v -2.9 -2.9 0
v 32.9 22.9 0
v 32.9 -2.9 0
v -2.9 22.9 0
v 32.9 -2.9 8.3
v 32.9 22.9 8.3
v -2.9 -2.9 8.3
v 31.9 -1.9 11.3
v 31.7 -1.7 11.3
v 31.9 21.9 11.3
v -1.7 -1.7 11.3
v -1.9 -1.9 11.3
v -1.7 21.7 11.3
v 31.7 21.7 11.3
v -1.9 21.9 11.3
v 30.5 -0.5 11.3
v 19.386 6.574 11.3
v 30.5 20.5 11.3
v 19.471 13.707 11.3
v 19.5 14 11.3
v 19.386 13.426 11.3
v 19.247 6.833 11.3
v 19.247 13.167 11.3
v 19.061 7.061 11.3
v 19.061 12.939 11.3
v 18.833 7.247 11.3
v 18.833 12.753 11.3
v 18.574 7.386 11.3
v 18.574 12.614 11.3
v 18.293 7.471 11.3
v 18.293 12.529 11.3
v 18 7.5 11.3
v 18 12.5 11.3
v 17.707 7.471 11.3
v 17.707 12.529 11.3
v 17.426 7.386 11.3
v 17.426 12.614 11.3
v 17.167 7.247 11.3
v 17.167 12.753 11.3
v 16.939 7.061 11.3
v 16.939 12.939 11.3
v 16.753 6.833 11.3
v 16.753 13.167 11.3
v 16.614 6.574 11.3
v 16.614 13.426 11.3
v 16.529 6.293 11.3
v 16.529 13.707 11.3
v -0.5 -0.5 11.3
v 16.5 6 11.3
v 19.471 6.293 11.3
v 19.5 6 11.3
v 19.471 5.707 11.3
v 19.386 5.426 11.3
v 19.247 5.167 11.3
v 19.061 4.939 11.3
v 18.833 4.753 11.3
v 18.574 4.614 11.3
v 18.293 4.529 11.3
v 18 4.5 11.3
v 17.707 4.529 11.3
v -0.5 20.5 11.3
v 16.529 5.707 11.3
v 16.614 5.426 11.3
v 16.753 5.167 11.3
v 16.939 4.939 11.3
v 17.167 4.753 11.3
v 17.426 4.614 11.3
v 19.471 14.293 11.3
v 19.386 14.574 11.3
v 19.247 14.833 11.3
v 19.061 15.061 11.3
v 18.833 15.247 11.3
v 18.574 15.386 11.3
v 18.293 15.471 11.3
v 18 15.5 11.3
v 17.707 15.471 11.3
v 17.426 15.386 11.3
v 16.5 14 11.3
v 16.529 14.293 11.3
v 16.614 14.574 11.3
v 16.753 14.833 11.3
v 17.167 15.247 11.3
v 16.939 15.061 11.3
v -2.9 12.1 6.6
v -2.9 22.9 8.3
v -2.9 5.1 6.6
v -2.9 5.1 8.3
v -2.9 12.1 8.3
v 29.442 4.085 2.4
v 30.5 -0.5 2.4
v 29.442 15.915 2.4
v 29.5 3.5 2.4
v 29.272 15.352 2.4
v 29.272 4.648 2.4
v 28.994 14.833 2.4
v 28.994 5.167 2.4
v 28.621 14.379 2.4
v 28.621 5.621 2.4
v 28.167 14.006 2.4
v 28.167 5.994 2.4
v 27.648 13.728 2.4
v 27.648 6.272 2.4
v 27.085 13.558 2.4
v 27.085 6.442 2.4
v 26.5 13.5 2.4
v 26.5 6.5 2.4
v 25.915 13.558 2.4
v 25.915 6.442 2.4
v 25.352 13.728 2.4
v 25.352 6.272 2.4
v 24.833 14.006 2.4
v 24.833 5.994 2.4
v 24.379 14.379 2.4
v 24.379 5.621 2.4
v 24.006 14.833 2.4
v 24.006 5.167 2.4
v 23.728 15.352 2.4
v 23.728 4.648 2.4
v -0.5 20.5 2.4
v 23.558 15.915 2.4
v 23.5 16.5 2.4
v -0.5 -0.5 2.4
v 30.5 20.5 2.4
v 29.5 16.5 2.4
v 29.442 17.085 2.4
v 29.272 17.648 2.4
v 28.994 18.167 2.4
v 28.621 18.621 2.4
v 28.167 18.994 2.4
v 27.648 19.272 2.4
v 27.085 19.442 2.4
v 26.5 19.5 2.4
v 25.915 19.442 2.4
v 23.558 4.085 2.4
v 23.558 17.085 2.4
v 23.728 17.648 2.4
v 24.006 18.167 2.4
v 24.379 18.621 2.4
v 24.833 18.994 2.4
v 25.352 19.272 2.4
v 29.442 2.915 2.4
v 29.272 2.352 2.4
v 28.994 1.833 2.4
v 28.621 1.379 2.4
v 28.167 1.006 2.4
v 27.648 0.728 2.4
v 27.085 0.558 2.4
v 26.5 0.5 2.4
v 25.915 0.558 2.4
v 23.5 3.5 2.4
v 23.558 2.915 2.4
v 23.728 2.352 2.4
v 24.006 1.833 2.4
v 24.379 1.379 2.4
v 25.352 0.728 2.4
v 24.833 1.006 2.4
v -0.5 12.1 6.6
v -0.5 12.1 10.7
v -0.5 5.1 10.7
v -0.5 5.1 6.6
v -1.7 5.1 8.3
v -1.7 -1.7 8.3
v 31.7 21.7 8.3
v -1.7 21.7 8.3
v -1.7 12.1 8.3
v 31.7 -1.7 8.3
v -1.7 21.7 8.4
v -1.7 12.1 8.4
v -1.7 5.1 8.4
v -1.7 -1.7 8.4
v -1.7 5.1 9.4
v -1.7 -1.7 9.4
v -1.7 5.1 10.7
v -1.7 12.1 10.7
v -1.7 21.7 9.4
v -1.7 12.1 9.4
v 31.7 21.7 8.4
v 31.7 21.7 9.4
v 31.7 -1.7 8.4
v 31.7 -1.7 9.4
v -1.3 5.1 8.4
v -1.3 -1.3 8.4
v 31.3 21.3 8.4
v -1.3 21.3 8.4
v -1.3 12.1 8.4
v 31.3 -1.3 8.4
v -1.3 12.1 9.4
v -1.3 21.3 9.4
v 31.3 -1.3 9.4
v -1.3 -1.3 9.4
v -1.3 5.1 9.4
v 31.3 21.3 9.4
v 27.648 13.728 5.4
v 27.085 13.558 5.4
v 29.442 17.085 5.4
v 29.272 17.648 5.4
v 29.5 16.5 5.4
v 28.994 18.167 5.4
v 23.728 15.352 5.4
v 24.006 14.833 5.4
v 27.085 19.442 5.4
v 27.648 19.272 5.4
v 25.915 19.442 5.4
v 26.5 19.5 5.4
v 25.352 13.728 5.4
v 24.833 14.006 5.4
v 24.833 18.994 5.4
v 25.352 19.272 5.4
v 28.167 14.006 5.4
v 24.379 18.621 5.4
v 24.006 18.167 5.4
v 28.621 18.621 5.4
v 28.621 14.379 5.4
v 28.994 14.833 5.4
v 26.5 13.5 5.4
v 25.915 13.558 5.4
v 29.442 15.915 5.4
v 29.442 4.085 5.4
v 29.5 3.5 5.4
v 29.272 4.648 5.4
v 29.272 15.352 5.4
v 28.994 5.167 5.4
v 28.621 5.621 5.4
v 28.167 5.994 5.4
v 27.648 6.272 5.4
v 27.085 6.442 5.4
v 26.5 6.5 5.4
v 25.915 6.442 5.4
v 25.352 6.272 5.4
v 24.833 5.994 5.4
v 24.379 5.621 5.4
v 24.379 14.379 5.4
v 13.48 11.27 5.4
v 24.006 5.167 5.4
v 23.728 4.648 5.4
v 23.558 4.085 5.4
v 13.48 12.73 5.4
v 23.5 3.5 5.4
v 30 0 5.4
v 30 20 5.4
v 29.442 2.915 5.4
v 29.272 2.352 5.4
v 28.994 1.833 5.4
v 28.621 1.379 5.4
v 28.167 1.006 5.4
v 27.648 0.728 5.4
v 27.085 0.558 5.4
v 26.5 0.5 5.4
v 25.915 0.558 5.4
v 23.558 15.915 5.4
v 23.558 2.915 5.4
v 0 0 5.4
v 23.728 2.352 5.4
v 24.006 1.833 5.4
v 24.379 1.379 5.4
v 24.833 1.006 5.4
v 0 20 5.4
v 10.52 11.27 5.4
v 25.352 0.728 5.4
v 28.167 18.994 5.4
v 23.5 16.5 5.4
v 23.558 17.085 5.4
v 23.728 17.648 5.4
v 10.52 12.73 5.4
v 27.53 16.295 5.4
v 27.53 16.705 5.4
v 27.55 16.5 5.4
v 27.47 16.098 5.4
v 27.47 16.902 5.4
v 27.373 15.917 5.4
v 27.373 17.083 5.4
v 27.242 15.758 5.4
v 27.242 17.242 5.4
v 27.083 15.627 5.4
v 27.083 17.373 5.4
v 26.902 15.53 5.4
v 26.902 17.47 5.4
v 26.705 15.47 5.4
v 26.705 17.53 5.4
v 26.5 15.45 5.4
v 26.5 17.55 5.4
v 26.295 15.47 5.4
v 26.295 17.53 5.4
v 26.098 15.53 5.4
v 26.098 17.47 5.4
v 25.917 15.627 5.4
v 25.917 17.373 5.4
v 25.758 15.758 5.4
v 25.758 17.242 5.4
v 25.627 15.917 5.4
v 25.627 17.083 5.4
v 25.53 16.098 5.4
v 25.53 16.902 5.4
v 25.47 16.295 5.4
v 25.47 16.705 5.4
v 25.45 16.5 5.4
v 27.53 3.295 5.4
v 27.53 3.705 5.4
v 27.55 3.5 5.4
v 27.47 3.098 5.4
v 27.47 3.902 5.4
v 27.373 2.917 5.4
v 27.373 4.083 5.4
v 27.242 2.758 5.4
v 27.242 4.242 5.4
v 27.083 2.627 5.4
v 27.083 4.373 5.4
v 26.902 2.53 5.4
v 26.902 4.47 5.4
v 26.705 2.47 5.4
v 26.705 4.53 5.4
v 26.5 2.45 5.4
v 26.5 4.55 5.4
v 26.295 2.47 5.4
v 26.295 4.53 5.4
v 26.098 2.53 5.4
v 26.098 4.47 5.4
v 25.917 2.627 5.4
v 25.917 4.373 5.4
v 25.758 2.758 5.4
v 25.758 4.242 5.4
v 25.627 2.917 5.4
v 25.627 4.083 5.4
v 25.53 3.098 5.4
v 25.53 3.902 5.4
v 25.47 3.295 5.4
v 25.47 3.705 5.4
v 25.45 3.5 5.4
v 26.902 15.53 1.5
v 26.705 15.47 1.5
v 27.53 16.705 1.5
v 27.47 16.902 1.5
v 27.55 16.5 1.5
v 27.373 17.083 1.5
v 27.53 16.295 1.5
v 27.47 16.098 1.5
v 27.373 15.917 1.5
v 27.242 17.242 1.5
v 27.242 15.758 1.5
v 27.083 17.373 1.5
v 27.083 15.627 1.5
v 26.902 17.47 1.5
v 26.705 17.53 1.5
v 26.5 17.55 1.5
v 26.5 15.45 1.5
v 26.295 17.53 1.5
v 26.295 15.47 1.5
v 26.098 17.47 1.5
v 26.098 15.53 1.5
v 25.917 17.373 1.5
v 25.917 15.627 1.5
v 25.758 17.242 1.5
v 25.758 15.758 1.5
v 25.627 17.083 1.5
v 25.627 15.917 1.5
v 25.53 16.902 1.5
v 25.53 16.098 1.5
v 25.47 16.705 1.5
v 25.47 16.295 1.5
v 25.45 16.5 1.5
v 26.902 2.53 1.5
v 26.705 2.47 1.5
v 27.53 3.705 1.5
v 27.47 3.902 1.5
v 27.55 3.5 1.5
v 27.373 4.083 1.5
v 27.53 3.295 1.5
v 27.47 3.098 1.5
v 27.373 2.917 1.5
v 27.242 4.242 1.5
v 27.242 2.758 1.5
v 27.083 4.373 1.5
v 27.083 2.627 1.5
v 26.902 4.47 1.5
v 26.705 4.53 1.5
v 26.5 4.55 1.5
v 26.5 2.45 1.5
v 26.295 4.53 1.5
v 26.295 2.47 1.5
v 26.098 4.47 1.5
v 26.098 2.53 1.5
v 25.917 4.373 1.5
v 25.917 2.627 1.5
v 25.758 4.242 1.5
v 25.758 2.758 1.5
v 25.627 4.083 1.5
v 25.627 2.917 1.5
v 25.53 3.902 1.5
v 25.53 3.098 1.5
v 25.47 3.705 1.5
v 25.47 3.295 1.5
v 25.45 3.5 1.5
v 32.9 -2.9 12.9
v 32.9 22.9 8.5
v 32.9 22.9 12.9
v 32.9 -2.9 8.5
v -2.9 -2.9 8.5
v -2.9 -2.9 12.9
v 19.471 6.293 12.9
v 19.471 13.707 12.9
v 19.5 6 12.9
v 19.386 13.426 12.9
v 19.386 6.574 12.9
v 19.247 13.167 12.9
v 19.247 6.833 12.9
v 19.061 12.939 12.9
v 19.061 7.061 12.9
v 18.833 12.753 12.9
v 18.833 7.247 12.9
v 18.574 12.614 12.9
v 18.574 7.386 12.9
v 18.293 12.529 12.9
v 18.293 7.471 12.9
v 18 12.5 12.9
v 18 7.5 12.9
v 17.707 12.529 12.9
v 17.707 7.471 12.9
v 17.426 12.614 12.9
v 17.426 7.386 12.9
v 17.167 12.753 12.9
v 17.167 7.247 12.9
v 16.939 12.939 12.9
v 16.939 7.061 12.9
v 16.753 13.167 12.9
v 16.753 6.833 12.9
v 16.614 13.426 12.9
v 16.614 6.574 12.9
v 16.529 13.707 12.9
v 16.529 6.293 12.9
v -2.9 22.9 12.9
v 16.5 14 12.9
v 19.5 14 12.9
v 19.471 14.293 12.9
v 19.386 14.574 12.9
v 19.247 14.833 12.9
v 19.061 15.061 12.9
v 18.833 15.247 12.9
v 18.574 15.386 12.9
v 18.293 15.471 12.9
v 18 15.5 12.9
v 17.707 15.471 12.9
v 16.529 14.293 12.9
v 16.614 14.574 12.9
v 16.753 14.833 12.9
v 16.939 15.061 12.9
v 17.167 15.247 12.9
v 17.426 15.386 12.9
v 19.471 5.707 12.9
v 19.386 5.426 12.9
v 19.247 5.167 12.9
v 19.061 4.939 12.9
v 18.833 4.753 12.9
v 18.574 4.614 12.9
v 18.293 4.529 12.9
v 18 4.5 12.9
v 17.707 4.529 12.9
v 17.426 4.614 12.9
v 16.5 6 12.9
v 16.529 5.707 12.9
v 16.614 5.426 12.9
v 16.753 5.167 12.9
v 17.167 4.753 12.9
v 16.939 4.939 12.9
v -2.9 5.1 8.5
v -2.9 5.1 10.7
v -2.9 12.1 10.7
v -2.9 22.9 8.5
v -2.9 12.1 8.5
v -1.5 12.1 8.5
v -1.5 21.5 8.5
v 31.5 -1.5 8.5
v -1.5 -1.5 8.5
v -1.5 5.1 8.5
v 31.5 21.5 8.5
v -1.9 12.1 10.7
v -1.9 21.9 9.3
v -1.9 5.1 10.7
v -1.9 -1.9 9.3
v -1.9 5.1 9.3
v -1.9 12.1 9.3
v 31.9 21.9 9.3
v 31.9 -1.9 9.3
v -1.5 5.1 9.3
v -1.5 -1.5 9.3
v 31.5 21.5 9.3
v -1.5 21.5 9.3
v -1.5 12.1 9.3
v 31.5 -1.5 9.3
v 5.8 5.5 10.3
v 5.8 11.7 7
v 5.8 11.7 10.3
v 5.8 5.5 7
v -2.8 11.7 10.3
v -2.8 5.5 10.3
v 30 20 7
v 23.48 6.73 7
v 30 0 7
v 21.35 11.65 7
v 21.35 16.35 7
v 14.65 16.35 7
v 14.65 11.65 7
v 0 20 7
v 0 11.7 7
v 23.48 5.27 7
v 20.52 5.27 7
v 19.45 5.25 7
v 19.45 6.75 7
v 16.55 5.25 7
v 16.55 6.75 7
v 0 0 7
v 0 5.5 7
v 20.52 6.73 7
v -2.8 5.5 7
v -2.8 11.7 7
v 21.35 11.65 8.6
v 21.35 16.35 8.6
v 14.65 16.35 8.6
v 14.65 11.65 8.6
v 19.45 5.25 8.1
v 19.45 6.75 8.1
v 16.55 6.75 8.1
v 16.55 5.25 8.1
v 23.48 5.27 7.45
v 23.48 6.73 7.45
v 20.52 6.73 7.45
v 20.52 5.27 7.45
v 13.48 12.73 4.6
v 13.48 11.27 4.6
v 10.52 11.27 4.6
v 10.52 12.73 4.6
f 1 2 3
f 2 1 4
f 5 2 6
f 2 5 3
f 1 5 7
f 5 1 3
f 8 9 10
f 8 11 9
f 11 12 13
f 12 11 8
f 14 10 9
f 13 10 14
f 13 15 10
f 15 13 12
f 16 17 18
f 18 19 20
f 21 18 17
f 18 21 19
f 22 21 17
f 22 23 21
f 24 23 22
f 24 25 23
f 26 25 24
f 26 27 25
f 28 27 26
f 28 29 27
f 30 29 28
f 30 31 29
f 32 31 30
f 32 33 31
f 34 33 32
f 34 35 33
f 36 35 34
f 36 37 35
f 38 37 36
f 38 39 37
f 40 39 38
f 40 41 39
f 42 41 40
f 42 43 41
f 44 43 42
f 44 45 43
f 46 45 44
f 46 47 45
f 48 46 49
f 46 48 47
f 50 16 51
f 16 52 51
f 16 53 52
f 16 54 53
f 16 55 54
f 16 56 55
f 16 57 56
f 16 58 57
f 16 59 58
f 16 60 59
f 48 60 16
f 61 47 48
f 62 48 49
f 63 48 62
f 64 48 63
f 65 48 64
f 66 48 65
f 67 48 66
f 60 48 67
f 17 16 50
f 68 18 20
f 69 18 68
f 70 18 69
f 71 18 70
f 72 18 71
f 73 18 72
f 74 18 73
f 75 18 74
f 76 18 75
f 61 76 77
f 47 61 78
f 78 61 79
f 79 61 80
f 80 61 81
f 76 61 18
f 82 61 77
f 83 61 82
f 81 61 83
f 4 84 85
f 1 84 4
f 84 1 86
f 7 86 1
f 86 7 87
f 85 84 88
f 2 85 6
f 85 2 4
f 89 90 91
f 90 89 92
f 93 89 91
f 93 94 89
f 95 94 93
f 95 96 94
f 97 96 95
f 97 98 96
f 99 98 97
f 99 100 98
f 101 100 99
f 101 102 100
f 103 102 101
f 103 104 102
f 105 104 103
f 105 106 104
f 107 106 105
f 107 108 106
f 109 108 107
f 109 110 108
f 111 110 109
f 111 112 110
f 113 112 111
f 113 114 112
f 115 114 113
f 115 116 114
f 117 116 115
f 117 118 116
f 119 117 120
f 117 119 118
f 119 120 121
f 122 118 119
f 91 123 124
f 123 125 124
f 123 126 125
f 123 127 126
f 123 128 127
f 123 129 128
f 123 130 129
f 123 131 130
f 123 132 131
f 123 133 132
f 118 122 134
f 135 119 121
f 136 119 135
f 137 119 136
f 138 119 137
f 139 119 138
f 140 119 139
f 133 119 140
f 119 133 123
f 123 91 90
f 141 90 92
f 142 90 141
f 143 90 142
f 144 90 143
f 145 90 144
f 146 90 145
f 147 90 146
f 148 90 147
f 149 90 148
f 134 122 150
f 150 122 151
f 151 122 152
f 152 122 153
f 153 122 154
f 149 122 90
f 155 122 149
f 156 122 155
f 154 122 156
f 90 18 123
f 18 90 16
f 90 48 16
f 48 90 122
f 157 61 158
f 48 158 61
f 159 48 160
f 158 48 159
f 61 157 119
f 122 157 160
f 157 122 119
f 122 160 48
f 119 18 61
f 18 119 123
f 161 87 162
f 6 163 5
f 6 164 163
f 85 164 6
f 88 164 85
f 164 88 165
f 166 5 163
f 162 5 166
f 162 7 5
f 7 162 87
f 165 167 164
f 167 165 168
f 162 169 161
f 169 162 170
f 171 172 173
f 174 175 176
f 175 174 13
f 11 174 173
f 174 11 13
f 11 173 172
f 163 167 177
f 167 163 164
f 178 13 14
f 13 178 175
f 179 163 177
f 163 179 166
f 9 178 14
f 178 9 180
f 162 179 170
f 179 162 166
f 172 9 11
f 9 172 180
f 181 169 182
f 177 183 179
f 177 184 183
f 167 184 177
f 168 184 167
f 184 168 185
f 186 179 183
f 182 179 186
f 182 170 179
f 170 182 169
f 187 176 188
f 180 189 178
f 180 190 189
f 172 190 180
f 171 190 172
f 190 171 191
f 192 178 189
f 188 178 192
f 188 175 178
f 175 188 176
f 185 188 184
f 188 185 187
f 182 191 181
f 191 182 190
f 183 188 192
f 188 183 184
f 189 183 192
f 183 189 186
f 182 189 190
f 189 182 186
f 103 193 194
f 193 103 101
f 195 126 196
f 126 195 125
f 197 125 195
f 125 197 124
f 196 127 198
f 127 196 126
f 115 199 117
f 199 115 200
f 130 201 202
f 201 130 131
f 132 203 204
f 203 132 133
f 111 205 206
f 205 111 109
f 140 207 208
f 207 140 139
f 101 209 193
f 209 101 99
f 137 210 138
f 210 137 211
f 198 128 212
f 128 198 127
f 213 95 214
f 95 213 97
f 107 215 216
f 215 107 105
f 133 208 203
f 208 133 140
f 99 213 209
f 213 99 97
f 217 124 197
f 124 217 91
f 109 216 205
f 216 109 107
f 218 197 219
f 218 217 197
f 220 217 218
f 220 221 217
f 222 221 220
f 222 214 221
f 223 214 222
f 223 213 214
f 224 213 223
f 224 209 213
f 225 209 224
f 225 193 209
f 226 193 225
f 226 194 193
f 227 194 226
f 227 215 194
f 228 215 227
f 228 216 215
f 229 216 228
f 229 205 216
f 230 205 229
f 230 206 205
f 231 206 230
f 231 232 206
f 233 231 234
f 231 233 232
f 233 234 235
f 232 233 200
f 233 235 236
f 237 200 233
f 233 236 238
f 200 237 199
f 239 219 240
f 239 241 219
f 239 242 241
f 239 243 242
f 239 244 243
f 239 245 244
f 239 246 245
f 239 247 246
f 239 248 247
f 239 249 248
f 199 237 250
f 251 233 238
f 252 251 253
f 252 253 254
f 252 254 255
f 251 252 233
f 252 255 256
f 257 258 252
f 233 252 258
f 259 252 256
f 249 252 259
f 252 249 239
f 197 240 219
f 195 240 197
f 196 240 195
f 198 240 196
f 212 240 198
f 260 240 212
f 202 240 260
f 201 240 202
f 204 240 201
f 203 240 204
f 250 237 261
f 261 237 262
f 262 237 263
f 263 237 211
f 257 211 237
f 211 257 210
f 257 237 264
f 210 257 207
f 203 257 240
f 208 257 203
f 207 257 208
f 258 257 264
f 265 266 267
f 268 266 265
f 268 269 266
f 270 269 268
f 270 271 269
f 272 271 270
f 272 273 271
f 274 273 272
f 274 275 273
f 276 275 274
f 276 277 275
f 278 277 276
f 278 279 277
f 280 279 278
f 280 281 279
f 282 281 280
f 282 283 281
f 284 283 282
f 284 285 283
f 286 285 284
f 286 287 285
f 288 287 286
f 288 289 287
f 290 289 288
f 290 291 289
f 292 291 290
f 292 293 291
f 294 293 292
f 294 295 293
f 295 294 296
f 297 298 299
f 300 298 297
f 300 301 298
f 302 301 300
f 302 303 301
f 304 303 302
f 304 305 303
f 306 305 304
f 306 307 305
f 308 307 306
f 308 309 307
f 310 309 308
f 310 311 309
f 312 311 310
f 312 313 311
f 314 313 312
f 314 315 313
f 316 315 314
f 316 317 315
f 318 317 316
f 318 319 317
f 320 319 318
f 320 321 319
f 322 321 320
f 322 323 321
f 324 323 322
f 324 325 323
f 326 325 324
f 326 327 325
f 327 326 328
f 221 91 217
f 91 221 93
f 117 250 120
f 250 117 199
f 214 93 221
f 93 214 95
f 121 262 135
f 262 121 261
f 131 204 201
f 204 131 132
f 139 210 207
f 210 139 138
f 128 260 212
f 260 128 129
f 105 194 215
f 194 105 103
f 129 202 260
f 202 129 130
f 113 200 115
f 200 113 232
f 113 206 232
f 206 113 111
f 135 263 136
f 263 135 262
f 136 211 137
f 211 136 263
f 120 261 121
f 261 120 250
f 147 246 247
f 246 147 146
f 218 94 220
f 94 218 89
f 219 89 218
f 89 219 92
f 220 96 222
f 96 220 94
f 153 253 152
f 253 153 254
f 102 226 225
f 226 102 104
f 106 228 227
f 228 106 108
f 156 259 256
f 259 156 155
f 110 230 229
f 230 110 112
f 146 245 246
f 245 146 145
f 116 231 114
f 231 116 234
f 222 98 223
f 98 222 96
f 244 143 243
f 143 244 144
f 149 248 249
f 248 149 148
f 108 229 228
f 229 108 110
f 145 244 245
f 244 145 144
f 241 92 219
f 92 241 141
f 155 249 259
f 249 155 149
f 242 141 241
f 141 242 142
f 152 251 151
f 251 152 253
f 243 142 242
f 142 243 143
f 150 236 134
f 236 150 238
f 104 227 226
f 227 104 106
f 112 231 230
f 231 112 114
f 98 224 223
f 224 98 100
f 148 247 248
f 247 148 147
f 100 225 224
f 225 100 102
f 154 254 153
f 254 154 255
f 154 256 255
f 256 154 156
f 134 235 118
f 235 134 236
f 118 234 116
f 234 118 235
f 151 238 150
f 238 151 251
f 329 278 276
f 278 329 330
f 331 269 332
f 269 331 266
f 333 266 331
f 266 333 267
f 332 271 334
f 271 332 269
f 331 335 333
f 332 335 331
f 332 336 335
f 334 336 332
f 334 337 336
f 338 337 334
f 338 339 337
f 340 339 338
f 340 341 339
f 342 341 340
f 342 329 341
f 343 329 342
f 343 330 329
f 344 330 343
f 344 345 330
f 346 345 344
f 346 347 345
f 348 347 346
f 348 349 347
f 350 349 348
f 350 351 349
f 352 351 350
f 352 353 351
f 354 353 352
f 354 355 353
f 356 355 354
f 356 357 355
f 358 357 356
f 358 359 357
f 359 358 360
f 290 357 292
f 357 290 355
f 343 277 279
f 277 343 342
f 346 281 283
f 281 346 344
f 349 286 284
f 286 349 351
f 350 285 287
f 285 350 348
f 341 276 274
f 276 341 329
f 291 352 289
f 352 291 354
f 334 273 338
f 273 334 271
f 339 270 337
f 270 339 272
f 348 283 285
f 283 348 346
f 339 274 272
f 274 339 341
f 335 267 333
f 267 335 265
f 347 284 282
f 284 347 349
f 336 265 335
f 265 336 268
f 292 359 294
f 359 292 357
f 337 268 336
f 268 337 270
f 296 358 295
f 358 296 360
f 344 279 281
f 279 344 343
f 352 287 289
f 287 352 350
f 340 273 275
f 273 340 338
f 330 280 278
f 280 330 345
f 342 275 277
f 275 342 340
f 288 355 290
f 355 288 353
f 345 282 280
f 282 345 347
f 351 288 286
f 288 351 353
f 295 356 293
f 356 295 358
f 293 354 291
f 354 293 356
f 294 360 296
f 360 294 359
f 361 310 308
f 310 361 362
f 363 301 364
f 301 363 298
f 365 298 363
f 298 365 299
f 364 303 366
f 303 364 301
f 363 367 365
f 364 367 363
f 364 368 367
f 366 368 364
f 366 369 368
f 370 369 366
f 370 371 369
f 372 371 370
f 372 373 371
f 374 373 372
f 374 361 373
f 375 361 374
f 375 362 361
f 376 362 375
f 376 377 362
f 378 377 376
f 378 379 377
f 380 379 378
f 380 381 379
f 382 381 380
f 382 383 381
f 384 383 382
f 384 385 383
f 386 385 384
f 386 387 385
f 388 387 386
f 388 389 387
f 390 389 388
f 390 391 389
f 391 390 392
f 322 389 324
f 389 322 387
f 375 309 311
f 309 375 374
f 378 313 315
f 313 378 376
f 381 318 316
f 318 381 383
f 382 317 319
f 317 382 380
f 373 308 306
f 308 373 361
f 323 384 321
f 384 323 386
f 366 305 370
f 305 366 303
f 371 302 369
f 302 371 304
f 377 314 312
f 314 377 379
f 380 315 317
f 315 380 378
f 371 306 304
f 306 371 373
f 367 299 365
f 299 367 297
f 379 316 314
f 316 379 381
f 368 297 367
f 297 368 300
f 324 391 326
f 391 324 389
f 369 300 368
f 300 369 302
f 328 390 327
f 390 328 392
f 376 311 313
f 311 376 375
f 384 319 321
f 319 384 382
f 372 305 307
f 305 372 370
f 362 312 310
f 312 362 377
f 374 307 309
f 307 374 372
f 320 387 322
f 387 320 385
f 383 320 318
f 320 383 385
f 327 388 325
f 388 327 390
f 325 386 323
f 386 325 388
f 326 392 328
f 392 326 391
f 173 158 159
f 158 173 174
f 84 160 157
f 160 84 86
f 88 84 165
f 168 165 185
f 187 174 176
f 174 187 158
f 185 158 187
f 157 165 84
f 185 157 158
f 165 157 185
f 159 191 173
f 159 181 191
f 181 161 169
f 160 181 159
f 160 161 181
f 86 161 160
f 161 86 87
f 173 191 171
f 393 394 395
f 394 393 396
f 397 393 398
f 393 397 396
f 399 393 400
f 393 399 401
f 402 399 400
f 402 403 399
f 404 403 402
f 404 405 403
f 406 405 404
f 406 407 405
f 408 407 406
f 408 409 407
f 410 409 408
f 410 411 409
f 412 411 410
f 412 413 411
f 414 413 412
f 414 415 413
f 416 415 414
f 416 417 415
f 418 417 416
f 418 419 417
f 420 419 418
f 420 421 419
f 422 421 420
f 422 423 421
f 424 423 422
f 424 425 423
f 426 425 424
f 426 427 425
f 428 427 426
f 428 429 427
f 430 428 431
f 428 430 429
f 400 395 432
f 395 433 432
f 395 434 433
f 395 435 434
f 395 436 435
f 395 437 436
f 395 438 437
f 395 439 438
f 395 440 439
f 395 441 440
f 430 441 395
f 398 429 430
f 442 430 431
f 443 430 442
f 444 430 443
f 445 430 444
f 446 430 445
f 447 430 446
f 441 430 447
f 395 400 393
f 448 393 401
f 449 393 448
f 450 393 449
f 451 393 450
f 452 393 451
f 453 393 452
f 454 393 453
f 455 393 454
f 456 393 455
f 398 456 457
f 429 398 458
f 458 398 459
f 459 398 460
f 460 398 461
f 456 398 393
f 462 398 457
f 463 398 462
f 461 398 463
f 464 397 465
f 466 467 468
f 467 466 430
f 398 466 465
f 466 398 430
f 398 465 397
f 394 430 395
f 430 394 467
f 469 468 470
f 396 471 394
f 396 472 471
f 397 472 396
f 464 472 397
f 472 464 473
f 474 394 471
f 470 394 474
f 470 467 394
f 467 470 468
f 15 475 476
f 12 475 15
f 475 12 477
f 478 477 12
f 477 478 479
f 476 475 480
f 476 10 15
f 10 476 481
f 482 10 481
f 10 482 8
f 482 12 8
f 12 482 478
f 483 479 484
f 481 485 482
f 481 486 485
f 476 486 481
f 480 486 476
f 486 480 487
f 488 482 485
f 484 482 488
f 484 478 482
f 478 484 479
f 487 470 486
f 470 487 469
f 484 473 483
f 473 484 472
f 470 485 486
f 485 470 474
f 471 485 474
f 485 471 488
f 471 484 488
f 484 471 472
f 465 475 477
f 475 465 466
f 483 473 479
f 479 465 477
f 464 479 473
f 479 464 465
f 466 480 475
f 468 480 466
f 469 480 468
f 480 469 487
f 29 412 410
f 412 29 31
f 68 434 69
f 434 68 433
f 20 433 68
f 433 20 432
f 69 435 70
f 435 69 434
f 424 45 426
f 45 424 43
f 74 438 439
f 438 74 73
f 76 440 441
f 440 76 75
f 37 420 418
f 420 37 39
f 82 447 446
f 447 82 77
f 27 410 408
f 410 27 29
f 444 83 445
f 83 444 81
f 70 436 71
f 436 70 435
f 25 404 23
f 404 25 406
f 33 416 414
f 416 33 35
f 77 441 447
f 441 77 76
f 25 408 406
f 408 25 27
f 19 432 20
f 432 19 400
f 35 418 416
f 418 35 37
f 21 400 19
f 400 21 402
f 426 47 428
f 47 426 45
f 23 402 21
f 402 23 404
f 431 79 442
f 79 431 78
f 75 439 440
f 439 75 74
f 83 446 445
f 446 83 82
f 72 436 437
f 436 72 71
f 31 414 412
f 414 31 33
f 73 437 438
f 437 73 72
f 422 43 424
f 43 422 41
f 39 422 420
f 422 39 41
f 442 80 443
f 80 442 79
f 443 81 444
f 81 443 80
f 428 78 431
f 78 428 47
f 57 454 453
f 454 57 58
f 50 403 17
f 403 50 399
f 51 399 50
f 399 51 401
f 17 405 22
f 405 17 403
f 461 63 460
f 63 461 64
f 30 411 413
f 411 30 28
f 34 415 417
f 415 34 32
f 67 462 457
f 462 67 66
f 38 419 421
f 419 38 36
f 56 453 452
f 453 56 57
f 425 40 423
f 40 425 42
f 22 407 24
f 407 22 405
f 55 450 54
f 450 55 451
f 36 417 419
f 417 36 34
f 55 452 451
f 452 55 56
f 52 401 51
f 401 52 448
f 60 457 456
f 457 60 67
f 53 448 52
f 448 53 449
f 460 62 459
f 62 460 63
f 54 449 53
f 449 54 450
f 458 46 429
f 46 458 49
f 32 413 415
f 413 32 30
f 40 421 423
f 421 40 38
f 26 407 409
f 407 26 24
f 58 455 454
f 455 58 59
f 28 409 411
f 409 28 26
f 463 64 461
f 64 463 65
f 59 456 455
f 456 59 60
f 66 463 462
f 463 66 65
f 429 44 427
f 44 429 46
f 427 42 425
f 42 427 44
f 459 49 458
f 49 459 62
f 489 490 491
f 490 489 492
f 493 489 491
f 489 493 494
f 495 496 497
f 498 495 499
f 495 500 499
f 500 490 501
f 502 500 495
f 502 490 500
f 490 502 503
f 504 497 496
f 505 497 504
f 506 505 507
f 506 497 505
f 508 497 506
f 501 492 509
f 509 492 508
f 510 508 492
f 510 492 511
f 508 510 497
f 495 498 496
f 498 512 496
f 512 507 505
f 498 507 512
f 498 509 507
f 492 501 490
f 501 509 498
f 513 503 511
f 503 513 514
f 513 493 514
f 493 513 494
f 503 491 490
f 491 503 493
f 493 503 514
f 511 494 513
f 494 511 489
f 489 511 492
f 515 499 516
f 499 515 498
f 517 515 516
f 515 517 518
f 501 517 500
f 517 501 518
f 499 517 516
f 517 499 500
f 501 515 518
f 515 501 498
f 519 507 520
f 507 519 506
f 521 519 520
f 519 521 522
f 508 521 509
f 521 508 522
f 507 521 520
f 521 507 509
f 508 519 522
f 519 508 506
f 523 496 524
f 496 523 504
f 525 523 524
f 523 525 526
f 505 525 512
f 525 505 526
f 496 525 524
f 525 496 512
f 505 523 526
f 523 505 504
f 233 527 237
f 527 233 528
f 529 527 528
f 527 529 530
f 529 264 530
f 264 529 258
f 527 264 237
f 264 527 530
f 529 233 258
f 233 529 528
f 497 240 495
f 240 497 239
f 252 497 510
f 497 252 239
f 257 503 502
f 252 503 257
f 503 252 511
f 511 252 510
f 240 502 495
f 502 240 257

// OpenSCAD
// file: usbc_snap_lid.scad
// The lid of the housing "usbc_snap", written by enclosure-nv 0.1.0
// from the board file usbc_board.kicad_pcb.  Render with OpenSCAD.
// Parameters, in millimetres.  The same block heads every file of this housing:
// when a value is changed, change it in each file.
wall = 2.4;
floor_t = 2.4;
lid_t = 1.6;
clear = 0.5;  // the board's edge to the inside of the wall
standoff_d = 6;
screw_d = 2.5;
pilot_d = 2.1;
head_d = 5;
head_h = 1.6;
lip_h = 3;  // the height of the step the lid sits on
lid_gap = 0.2;
snap_depth = 0.4;
snap_h = 0.8;
led_d = 3;
button_d = 3;
board_t = 1.6;
standoff_h = 3;  // the space under the board
top_space = 4.3;  // the space above the board
pilot_len = 3.9;  // the depth of the screw's hole
print_flip = false;  // true lays the lid plate down

// Levels along z.
z_bb = floor_t + standoff_h;
z_bt = z_bb + board_t;
z_split = z_bt + top_space;
z_step = z_split - lip_h;
z_top = z_split + lid_t;
z_skirt = z_step + lid_gap;
a_in = wall / 2;
screw_clear = screw_d + 0.3;

module outline() {
  polygon(points = [[0, 0], [30, 0], [30, 20], [0, 20]]);
}

module lid() {
  difference() {
    union() {
      // the plate
      translate([0, 0, z_split]) linear_extrude(height = lid_t) offset(delta = clear + wall) outline();
      // the skirt that takes the place of the outer half of the wall
      translate([0, 0, z_skirt]) linear_extrude(height = z_split - z_skirt + 0.2) difference() {
        offset(delta = clear + wall) outline();
        offset(delta = clear + a_in + lid_gap) outline();
      }
      // the bead that clicks into the wall's groove
      translate([0, 0, z_skirt]) linear_extrude(height = snap_h) difference() {
        offset(delta = clear + a_in + lid_gap + 0.2) outline();
        offset(delta = clear + a_in + lid_gap - snap_depth) outline();
      }
    }
    // the openings
    translate([0, 8.6, z_bt + (-0.4)]) rotate([0, 0, 180]) translate([-1, -3.5, 0]) cube([clear + wall + 2, 7, 4.1]);
    translate([18, 14, z_split - 1]) cylinder(h = lid_t + 2, d = 3, $fn = 32);
    translate([18, 6, z_split - 1]) cylinder(h = lid_t + 2, d = 3, $fn = 32);
  }
}

if (print_flip) {
  translate([0, 20, z_top]) rotate([180, 0, 0]) lid();
} else {
  lid();
}
// file: usbc_snap_base.scad
// The base of the housing "usbc_snap", written by enclosure-nv 0.1.0
// from the board file usbc_board.kicad_pcb.  Render with OpenSCAD.
// Parameters, in millimetres.  The same block heads every file of this housing:
// when a value is changed, change it in each file.
wall = 2.4;
floor_t = 2.4;
lid_t = 1.6;
clear = 0.5;  // the board's edge to the inside of the wall
standoff_d = 6;
screw_d = 2.5;
pilot_d = 2.1;
head_d = 5;
head_h = 1.6;
lip_h = 3;  // the height of the step the lid sits on
lid_gap = 0.2;
snap_depth = 0.4;
snap_h = 0.8;
led_d = 3;
button_d = 3;
board_t = 1.6;
standoff_h = 3;  // the space under the board
top_space = 4.3;  // the space above the board
pilot_len = 3.9;  // the depth of the screw's hole
print_flip = false;  // true lays the lid plate down

// Levels along z.
z_bb = floor_t + standoff_h;
z_bt = z_bb + board_t;
z_split = z_bt + top_space;
z_step = z_split - lip_h;
z_top = z_split + lid_t;
z_skirt = z_step + lid_gap;
a_in = wall / 2;
screw_clear = screw_d + 0.3;

module outline() {
  polygon(points = [[0, 0], [30, 0], [30, 20], [0, 20]]);
}

module base() {
  difference() {
    union() {
      difference() {
        linear_extrude(height = z_split) offset(delta = clear + wall) outline();
        translate([0, 0, floor_t]) linear_extrude(height = z_split) offset(delta = clear) outline();
        translate([0, 0, z_step]) linear_extrude(height = z_split) difference() {
          offset(delta = clear + wall + 1) outline();
          offset(delta = clear + a_in) outline();
        }
        // the groove the lid's bead clicks into
        translate([0, 0, z_skirt - 0.1]) linear_extrude(height = snap_h + 0.2) difference() {
          offset(delta = clear + a_in + 0.01) outline();
          offset(delta = clear + a_in - snap_depth) outline();
        }
      }
      // the standoffs
      translate([26.5, 16.5, floor_t / 2]) cylinder(h = z_bb - floor_t / 2, d = standoff_d, $fn = 32);
      translate([26.5, 3.5, floor_t / 2]) cylinder(h = z_bb - floor_t / 2, d = standoff_d, $fn = 32);
    }
    // the screw holes, blind
    translate([26.5, 16.5, z_bb - pilot_len]) cylinder(h = pilot_len + 1, d = pilot_d, $fn = 32);
    translate([26.5, 3.5, z_bb - pilot_len]) cylinder(h = pilot_len + 1, d = pilot_d, $fn = 32);
    // the openings
    translate([0, 8.6, z_bt + (-0.4)]) rotate([0, 0, 180]) translate([-1, -3.5, 0]) cube([clear + wall + 2, 7, 4.1]);
  }
}

base();
// main file
// The assembly of the housing "usbc_snap", written by enclosure-nv 0.1.0
// from the board file usbc_board.kicad_pcb.  Render with OpenSCAD.
// Parameters, in millimetres.  The same block heads every file of this housing:
// when a value is changed, change it in each file.
wall = 2.4;
floor_t = 2.4;
lid_t = 1.6;
clear = 0.5;  // the board's edge to the inside of the wall
standoff_d = 6;
screw_d = 2.5;
pilot_d = 2.1;
head_d = 5;
head_h = 1.6;
lip_h = 3;  // the height of the step the lid sits on
lid_gap = 0.2;
snap_depth = 0.4;
snap_h = 0.8;
led_d = 3;
button_d = 3;
board_t = 1.6;
standoff_h = 3;  // the space under the board
top_space = 4.3;  // the space above the board
pilot_len = 3.9;  // the depth of the screw's hole
print_flip = false;  // true lays the lid plate down

// Levels along z.
z_bb = floor_t + standoff_h;
z_bt = z_bb + board_t;
z_split = z_bt + top_space;
z_step = z_split - lip_h;
z_top = z_split + lid_t;
z_skirt = z_step + lid_gap;
a_in = wall / 2;
screw_clear = screw_d + 0.3;

use <usbc_snap_base.scad>
use <usbc_snap_lid.scad>

module board_outline() {
  polygon(points = [[0, 0], [30, 0], [30, 20], [0, 20]]);
}

module board() {
  color([0.1, 0.55, 0.25, 0.8]) translate([0, 0, z_bb]) linear_extrude(height = board_t) difference() {
    board_outline();
  }
}

module parts() {
  color([0.75, 0.75, 0.75, 0.9]) {
    translate([-2.8, 5.5, 7]) cube([8.6, 6.2, 3.3]);  // J1
    translate([14.65, 11.65, 7]) cube([6.7, 4.7, 1.6]);  // SW1
    translate([16.55, 5.25, 7]) cube([2.9, 1.5, 1.1]);  // D1
    translate([20.52, 5.27, 7]) cube([2.96, 1.46, 0.45]);  // R1
    translate([10.52, 11.27, 4.6]) cube([2.96, 1.46, 0.8]);  // C1
  }
}

base();
lid();
board();
parts();
